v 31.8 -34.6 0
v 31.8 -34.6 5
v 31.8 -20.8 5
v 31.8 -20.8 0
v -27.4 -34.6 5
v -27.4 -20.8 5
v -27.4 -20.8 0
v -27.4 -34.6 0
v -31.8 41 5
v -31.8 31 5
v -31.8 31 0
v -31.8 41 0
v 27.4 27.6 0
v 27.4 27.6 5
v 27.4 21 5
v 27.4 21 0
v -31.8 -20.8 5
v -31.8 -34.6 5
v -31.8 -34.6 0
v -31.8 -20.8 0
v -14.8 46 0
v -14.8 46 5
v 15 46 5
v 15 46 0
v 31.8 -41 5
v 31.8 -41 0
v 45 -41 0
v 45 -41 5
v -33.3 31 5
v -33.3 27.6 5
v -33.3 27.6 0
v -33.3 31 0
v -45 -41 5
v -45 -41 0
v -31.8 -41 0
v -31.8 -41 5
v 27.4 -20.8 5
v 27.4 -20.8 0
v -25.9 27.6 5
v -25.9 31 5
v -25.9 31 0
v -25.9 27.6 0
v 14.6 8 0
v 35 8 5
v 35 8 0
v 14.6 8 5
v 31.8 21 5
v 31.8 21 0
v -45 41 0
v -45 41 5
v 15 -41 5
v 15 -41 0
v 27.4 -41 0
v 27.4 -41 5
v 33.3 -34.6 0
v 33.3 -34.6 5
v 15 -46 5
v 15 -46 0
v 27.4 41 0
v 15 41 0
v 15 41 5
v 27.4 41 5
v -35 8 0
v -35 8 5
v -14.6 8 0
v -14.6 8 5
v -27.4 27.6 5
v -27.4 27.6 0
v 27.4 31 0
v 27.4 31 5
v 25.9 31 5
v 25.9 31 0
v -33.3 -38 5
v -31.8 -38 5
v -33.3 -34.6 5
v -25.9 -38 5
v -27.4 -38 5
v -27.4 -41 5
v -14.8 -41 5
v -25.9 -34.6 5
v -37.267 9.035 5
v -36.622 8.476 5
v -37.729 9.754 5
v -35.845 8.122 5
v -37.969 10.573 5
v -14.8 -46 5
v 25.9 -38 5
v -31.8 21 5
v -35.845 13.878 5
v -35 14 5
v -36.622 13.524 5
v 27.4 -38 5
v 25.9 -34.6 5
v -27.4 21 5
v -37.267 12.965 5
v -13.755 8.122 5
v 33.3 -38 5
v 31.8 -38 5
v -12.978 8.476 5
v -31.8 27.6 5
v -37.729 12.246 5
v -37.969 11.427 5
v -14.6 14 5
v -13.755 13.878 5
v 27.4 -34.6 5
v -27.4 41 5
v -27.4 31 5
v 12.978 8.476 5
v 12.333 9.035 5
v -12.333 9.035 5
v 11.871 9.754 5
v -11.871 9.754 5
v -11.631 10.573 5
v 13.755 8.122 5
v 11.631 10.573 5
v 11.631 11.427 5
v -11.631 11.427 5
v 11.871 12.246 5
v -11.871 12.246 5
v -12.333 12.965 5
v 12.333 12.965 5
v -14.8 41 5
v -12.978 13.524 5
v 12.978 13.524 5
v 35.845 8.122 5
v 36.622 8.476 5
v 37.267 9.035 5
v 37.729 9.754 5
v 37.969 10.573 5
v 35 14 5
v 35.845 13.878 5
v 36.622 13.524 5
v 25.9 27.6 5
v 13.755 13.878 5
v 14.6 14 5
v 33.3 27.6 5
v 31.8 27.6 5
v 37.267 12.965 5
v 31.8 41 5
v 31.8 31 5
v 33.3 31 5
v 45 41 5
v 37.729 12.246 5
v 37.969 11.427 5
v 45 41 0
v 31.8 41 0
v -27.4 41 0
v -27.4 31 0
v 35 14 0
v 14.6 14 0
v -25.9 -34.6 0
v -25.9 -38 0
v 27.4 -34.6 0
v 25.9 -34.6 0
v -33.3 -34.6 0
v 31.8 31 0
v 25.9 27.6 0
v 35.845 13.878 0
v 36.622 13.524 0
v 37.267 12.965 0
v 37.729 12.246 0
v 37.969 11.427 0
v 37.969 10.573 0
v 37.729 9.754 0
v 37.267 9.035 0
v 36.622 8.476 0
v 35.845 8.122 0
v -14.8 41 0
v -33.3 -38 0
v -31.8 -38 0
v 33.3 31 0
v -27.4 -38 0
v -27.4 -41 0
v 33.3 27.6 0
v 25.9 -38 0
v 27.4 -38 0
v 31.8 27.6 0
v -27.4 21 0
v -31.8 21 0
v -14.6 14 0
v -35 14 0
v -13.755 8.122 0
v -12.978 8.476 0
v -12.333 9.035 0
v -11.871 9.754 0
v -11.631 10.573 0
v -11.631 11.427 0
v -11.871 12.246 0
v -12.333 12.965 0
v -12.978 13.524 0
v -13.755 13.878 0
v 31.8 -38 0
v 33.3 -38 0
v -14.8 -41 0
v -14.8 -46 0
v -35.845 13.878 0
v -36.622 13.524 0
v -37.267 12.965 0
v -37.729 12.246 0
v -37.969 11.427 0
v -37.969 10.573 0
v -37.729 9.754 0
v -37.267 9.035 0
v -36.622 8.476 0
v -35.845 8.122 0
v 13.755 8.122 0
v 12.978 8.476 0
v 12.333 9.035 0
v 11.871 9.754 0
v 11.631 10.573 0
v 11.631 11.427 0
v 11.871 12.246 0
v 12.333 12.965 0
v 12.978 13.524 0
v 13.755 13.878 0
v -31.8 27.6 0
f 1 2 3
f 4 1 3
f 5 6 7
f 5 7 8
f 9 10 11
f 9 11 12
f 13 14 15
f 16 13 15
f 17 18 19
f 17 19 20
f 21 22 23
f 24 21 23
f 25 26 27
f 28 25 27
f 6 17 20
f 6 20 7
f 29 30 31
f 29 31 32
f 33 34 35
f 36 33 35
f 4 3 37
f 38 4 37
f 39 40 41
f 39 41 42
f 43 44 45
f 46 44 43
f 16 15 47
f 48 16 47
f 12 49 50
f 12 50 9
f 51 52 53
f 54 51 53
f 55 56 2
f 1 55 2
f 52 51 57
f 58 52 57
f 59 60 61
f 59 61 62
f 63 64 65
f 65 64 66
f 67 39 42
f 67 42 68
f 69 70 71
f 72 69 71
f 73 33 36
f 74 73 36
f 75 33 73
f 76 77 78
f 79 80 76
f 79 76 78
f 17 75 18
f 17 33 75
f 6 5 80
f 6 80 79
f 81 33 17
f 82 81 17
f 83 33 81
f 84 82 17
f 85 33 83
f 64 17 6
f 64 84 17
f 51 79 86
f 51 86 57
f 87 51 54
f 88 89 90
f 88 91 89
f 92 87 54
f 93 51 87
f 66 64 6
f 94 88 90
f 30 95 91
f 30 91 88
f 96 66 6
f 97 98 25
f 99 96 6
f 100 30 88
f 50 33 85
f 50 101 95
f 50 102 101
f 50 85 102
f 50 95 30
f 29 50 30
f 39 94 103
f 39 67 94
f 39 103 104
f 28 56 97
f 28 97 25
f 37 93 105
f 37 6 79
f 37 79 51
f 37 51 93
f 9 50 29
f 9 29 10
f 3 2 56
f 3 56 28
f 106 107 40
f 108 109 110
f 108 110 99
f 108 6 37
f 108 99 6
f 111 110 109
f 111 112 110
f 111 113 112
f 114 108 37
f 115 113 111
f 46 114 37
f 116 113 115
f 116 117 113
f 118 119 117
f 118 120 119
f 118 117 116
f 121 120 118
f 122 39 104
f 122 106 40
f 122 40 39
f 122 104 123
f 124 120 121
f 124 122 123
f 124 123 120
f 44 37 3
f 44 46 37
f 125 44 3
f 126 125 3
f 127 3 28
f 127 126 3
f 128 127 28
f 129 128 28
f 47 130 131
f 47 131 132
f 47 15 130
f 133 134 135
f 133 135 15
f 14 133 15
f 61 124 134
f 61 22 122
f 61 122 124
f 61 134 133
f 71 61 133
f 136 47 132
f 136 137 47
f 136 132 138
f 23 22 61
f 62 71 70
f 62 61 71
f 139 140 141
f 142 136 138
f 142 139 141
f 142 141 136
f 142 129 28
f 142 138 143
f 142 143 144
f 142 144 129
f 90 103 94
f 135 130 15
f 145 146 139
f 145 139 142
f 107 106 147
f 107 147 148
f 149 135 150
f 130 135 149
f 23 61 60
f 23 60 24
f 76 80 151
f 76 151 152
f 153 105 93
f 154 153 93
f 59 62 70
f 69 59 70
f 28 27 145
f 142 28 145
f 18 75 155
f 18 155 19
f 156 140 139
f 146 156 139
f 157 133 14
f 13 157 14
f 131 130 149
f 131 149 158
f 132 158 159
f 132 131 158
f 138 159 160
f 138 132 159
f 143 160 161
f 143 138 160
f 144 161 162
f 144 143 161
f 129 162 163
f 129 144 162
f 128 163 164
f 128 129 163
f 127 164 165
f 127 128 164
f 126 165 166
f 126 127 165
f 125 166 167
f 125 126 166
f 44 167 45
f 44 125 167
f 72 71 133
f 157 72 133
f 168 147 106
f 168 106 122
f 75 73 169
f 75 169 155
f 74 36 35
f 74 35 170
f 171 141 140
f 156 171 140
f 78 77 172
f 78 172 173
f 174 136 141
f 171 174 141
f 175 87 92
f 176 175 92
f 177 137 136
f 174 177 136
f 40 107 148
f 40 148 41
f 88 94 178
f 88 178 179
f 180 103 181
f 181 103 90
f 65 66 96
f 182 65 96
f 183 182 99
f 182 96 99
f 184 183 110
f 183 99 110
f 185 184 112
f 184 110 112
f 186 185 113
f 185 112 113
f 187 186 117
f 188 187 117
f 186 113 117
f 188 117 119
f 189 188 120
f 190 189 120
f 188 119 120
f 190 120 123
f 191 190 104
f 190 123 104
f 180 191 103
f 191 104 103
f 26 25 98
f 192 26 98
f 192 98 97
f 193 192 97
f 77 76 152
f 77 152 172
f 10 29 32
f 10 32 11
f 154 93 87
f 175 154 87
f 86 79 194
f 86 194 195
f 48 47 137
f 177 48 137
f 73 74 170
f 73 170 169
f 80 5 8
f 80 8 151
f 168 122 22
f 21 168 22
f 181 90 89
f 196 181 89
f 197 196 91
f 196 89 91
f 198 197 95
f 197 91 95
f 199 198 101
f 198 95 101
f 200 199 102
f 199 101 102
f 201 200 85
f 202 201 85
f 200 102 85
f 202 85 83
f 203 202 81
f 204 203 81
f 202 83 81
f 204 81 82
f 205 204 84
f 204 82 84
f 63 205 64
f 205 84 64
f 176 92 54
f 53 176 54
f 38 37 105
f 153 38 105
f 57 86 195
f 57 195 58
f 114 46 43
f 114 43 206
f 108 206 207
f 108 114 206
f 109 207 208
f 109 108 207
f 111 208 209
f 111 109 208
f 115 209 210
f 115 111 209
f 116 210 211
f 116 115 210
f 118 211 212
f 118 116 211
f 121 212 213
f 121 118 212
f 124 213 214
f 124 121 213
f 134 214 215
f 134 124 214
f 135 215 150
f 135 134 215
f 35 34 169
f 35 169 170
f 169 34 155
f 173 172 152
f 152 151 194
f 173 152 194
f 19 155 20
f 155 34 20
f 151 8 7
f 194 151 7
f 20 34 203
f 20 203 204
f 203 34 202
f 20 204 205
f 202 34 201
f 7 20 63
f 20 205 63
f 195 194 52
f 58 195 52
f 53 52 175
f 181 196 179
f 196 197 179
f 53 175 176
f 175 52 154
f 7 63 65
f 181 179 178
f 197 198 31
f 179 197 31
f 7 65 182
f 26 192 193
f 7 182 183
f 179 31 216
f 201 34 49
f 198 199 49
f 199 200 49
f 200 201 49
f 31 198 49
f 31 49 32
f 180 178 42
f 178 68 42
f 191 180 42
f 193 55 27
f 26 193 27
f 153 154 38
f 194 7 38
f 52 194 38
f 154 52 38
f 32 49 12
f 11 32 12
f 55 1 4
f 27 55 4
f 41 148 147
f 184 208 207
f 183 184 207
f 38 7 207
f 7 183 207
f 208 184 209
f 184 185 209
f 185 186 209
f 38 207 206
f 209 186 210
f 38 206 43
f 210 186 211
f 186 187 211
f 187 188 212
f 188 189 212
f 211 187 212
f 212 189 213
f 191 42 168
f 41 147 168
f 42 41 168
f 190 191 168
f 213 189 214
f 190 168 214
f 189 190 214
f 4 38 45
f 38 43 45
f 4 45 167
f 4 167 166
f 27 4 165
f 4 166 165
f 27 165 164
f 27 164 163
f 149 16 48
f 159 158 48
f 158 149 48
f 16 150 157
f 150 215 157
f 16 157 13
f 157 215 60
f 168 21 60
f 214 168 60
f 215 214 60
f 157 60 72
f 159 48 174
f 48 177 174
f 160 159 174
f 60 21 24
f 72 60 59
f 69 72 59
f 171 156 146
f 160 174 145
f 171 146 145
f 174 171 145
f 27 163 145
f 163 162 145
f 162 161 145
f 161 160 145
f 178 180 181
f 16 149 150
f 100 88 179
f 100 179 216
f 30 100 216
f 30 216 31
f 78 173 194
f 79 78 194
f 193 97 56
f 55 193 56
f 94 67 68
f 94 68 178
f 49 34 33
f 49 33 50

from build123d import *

# Parameters (mm, degrees)
SKETCH1_W           = 90
SKETCH1_H           = 82
BOSS_EXTRUDE1_DEPTH = 5
SKETCH4_W           = 29.8
SKETCH4_H           = 5
BOSS_EXTRUDE2_DEPTH = 5
CUT_EXTRUDE1_DEPTH  = 10
CUT_EXTRUDE2_DEPTH  = 10


with BuildPart() as part:
    # Sketch1 → Boss-Extrude1 (new body)
    with BuildSketch(Plane.XY):
        Rectangle(SKETCH1_W, SKETCH1_H)
    extrude(amount=BOSS_EXTRUDE1_DEPTH)

    # Sketch4 → Boss-Extrude2 (add)
    with BuildSketch(Plane.XY.offset(5)):
        with Locations((0.1, 43.5)):
            Rectangle(SKETCH4_W, SKETCH4_H)
    boss_extrude2 = extrude(amount=-BOSS_EXTRUDE2_DEPTH)

    # Mirror1: Boss-Extrude2 across plane
    add(boss_extrude2.mirror(Plane(origin=(0, 0, 0), x_dir=(0, 0, 1), z_dir=(0, -1, 0))))

    # Sketch5 → Cut-Extrude1 (cut)
    with BuildSketch(Plane.XY.offset(5)):
        Polygon((27.39999999, 41), (27.39999999, 31), (25.89999999, 31), (25.89999999, 27.6), (27.39999999, 27.6), (27.39999999, 21), (31.79999999, 21), (31.79999999, 27.6), (33.29999999, 27.6), (33.29999999, 31), (31.79999999, 31), (31.79999999, 41), align=None)
        Polygon((-27.39999999, 27.6), (-27.39999999, 21), (-31.79999999, 21), (-31.79999999, 27.6), (-33.29999999, 27.6), (-33.29999999, 31), (-31.79999999, 31), (-31.79999999, 41), (-27.39999999, 41), (-27.39999999, 31), (-25.89999999, 31), (-25.89999999, 27.6), align=None)
        Polygon((-27.4, -38), (-27.4, -41), (-31.8, -41), (-31.8, -38), (-33.3, -38), (-33.3, -34.6), (-31.8, -34.6), (-31.8, -20.8), (-27.4, -20.8), (-27.4, -34.6), (-25.9, -34.6), (-25.9, -38), align=None)
        Polygon((31.8, -41), (31.8, -38), (33.3, -38), (33.3, -34.6), (31.8, -34.6), (31.8, -20.8), (27.4, -20.8), (27.4, -34.6), (25.9, -34.6), (25.9, -38), (27.4, -38), (27.4, -41), align=None)
    extrude(amount=-CUT_EXTRUDE1_DEPTH, mode=Mode.SUBTRACT)

    # Sketch6 → Cut-Extrude2 (cut)
    with BuildSketch(Plane.XY.offset(5)):
        with BuildLine():
            Line((-14.6, 14), (-35, 14))
            ThreePointArc((-35, 14), (-38, 11), (-35, 8))
            Line((-35, 8), (-14.6, 8))
            ThreePointArc((-14.6, 8), (-11.6, 11), (-14.6, 14))
        make_face()
        with BuildLine():
            Line((35, 8), (14.6, 8))
            ThreePointArc((14.6, 8), (11.6, 11), (14.6, 14))
            Line((14.6, 14), (35, 14))
            ThreePointArc((35, 14), (38, 11), (35, 8))
        make_face()
    extrude(amount=-CUT_EXTRUDE2_DEPTH, mode=Mode.SUBTRACT)


solid = part.part
